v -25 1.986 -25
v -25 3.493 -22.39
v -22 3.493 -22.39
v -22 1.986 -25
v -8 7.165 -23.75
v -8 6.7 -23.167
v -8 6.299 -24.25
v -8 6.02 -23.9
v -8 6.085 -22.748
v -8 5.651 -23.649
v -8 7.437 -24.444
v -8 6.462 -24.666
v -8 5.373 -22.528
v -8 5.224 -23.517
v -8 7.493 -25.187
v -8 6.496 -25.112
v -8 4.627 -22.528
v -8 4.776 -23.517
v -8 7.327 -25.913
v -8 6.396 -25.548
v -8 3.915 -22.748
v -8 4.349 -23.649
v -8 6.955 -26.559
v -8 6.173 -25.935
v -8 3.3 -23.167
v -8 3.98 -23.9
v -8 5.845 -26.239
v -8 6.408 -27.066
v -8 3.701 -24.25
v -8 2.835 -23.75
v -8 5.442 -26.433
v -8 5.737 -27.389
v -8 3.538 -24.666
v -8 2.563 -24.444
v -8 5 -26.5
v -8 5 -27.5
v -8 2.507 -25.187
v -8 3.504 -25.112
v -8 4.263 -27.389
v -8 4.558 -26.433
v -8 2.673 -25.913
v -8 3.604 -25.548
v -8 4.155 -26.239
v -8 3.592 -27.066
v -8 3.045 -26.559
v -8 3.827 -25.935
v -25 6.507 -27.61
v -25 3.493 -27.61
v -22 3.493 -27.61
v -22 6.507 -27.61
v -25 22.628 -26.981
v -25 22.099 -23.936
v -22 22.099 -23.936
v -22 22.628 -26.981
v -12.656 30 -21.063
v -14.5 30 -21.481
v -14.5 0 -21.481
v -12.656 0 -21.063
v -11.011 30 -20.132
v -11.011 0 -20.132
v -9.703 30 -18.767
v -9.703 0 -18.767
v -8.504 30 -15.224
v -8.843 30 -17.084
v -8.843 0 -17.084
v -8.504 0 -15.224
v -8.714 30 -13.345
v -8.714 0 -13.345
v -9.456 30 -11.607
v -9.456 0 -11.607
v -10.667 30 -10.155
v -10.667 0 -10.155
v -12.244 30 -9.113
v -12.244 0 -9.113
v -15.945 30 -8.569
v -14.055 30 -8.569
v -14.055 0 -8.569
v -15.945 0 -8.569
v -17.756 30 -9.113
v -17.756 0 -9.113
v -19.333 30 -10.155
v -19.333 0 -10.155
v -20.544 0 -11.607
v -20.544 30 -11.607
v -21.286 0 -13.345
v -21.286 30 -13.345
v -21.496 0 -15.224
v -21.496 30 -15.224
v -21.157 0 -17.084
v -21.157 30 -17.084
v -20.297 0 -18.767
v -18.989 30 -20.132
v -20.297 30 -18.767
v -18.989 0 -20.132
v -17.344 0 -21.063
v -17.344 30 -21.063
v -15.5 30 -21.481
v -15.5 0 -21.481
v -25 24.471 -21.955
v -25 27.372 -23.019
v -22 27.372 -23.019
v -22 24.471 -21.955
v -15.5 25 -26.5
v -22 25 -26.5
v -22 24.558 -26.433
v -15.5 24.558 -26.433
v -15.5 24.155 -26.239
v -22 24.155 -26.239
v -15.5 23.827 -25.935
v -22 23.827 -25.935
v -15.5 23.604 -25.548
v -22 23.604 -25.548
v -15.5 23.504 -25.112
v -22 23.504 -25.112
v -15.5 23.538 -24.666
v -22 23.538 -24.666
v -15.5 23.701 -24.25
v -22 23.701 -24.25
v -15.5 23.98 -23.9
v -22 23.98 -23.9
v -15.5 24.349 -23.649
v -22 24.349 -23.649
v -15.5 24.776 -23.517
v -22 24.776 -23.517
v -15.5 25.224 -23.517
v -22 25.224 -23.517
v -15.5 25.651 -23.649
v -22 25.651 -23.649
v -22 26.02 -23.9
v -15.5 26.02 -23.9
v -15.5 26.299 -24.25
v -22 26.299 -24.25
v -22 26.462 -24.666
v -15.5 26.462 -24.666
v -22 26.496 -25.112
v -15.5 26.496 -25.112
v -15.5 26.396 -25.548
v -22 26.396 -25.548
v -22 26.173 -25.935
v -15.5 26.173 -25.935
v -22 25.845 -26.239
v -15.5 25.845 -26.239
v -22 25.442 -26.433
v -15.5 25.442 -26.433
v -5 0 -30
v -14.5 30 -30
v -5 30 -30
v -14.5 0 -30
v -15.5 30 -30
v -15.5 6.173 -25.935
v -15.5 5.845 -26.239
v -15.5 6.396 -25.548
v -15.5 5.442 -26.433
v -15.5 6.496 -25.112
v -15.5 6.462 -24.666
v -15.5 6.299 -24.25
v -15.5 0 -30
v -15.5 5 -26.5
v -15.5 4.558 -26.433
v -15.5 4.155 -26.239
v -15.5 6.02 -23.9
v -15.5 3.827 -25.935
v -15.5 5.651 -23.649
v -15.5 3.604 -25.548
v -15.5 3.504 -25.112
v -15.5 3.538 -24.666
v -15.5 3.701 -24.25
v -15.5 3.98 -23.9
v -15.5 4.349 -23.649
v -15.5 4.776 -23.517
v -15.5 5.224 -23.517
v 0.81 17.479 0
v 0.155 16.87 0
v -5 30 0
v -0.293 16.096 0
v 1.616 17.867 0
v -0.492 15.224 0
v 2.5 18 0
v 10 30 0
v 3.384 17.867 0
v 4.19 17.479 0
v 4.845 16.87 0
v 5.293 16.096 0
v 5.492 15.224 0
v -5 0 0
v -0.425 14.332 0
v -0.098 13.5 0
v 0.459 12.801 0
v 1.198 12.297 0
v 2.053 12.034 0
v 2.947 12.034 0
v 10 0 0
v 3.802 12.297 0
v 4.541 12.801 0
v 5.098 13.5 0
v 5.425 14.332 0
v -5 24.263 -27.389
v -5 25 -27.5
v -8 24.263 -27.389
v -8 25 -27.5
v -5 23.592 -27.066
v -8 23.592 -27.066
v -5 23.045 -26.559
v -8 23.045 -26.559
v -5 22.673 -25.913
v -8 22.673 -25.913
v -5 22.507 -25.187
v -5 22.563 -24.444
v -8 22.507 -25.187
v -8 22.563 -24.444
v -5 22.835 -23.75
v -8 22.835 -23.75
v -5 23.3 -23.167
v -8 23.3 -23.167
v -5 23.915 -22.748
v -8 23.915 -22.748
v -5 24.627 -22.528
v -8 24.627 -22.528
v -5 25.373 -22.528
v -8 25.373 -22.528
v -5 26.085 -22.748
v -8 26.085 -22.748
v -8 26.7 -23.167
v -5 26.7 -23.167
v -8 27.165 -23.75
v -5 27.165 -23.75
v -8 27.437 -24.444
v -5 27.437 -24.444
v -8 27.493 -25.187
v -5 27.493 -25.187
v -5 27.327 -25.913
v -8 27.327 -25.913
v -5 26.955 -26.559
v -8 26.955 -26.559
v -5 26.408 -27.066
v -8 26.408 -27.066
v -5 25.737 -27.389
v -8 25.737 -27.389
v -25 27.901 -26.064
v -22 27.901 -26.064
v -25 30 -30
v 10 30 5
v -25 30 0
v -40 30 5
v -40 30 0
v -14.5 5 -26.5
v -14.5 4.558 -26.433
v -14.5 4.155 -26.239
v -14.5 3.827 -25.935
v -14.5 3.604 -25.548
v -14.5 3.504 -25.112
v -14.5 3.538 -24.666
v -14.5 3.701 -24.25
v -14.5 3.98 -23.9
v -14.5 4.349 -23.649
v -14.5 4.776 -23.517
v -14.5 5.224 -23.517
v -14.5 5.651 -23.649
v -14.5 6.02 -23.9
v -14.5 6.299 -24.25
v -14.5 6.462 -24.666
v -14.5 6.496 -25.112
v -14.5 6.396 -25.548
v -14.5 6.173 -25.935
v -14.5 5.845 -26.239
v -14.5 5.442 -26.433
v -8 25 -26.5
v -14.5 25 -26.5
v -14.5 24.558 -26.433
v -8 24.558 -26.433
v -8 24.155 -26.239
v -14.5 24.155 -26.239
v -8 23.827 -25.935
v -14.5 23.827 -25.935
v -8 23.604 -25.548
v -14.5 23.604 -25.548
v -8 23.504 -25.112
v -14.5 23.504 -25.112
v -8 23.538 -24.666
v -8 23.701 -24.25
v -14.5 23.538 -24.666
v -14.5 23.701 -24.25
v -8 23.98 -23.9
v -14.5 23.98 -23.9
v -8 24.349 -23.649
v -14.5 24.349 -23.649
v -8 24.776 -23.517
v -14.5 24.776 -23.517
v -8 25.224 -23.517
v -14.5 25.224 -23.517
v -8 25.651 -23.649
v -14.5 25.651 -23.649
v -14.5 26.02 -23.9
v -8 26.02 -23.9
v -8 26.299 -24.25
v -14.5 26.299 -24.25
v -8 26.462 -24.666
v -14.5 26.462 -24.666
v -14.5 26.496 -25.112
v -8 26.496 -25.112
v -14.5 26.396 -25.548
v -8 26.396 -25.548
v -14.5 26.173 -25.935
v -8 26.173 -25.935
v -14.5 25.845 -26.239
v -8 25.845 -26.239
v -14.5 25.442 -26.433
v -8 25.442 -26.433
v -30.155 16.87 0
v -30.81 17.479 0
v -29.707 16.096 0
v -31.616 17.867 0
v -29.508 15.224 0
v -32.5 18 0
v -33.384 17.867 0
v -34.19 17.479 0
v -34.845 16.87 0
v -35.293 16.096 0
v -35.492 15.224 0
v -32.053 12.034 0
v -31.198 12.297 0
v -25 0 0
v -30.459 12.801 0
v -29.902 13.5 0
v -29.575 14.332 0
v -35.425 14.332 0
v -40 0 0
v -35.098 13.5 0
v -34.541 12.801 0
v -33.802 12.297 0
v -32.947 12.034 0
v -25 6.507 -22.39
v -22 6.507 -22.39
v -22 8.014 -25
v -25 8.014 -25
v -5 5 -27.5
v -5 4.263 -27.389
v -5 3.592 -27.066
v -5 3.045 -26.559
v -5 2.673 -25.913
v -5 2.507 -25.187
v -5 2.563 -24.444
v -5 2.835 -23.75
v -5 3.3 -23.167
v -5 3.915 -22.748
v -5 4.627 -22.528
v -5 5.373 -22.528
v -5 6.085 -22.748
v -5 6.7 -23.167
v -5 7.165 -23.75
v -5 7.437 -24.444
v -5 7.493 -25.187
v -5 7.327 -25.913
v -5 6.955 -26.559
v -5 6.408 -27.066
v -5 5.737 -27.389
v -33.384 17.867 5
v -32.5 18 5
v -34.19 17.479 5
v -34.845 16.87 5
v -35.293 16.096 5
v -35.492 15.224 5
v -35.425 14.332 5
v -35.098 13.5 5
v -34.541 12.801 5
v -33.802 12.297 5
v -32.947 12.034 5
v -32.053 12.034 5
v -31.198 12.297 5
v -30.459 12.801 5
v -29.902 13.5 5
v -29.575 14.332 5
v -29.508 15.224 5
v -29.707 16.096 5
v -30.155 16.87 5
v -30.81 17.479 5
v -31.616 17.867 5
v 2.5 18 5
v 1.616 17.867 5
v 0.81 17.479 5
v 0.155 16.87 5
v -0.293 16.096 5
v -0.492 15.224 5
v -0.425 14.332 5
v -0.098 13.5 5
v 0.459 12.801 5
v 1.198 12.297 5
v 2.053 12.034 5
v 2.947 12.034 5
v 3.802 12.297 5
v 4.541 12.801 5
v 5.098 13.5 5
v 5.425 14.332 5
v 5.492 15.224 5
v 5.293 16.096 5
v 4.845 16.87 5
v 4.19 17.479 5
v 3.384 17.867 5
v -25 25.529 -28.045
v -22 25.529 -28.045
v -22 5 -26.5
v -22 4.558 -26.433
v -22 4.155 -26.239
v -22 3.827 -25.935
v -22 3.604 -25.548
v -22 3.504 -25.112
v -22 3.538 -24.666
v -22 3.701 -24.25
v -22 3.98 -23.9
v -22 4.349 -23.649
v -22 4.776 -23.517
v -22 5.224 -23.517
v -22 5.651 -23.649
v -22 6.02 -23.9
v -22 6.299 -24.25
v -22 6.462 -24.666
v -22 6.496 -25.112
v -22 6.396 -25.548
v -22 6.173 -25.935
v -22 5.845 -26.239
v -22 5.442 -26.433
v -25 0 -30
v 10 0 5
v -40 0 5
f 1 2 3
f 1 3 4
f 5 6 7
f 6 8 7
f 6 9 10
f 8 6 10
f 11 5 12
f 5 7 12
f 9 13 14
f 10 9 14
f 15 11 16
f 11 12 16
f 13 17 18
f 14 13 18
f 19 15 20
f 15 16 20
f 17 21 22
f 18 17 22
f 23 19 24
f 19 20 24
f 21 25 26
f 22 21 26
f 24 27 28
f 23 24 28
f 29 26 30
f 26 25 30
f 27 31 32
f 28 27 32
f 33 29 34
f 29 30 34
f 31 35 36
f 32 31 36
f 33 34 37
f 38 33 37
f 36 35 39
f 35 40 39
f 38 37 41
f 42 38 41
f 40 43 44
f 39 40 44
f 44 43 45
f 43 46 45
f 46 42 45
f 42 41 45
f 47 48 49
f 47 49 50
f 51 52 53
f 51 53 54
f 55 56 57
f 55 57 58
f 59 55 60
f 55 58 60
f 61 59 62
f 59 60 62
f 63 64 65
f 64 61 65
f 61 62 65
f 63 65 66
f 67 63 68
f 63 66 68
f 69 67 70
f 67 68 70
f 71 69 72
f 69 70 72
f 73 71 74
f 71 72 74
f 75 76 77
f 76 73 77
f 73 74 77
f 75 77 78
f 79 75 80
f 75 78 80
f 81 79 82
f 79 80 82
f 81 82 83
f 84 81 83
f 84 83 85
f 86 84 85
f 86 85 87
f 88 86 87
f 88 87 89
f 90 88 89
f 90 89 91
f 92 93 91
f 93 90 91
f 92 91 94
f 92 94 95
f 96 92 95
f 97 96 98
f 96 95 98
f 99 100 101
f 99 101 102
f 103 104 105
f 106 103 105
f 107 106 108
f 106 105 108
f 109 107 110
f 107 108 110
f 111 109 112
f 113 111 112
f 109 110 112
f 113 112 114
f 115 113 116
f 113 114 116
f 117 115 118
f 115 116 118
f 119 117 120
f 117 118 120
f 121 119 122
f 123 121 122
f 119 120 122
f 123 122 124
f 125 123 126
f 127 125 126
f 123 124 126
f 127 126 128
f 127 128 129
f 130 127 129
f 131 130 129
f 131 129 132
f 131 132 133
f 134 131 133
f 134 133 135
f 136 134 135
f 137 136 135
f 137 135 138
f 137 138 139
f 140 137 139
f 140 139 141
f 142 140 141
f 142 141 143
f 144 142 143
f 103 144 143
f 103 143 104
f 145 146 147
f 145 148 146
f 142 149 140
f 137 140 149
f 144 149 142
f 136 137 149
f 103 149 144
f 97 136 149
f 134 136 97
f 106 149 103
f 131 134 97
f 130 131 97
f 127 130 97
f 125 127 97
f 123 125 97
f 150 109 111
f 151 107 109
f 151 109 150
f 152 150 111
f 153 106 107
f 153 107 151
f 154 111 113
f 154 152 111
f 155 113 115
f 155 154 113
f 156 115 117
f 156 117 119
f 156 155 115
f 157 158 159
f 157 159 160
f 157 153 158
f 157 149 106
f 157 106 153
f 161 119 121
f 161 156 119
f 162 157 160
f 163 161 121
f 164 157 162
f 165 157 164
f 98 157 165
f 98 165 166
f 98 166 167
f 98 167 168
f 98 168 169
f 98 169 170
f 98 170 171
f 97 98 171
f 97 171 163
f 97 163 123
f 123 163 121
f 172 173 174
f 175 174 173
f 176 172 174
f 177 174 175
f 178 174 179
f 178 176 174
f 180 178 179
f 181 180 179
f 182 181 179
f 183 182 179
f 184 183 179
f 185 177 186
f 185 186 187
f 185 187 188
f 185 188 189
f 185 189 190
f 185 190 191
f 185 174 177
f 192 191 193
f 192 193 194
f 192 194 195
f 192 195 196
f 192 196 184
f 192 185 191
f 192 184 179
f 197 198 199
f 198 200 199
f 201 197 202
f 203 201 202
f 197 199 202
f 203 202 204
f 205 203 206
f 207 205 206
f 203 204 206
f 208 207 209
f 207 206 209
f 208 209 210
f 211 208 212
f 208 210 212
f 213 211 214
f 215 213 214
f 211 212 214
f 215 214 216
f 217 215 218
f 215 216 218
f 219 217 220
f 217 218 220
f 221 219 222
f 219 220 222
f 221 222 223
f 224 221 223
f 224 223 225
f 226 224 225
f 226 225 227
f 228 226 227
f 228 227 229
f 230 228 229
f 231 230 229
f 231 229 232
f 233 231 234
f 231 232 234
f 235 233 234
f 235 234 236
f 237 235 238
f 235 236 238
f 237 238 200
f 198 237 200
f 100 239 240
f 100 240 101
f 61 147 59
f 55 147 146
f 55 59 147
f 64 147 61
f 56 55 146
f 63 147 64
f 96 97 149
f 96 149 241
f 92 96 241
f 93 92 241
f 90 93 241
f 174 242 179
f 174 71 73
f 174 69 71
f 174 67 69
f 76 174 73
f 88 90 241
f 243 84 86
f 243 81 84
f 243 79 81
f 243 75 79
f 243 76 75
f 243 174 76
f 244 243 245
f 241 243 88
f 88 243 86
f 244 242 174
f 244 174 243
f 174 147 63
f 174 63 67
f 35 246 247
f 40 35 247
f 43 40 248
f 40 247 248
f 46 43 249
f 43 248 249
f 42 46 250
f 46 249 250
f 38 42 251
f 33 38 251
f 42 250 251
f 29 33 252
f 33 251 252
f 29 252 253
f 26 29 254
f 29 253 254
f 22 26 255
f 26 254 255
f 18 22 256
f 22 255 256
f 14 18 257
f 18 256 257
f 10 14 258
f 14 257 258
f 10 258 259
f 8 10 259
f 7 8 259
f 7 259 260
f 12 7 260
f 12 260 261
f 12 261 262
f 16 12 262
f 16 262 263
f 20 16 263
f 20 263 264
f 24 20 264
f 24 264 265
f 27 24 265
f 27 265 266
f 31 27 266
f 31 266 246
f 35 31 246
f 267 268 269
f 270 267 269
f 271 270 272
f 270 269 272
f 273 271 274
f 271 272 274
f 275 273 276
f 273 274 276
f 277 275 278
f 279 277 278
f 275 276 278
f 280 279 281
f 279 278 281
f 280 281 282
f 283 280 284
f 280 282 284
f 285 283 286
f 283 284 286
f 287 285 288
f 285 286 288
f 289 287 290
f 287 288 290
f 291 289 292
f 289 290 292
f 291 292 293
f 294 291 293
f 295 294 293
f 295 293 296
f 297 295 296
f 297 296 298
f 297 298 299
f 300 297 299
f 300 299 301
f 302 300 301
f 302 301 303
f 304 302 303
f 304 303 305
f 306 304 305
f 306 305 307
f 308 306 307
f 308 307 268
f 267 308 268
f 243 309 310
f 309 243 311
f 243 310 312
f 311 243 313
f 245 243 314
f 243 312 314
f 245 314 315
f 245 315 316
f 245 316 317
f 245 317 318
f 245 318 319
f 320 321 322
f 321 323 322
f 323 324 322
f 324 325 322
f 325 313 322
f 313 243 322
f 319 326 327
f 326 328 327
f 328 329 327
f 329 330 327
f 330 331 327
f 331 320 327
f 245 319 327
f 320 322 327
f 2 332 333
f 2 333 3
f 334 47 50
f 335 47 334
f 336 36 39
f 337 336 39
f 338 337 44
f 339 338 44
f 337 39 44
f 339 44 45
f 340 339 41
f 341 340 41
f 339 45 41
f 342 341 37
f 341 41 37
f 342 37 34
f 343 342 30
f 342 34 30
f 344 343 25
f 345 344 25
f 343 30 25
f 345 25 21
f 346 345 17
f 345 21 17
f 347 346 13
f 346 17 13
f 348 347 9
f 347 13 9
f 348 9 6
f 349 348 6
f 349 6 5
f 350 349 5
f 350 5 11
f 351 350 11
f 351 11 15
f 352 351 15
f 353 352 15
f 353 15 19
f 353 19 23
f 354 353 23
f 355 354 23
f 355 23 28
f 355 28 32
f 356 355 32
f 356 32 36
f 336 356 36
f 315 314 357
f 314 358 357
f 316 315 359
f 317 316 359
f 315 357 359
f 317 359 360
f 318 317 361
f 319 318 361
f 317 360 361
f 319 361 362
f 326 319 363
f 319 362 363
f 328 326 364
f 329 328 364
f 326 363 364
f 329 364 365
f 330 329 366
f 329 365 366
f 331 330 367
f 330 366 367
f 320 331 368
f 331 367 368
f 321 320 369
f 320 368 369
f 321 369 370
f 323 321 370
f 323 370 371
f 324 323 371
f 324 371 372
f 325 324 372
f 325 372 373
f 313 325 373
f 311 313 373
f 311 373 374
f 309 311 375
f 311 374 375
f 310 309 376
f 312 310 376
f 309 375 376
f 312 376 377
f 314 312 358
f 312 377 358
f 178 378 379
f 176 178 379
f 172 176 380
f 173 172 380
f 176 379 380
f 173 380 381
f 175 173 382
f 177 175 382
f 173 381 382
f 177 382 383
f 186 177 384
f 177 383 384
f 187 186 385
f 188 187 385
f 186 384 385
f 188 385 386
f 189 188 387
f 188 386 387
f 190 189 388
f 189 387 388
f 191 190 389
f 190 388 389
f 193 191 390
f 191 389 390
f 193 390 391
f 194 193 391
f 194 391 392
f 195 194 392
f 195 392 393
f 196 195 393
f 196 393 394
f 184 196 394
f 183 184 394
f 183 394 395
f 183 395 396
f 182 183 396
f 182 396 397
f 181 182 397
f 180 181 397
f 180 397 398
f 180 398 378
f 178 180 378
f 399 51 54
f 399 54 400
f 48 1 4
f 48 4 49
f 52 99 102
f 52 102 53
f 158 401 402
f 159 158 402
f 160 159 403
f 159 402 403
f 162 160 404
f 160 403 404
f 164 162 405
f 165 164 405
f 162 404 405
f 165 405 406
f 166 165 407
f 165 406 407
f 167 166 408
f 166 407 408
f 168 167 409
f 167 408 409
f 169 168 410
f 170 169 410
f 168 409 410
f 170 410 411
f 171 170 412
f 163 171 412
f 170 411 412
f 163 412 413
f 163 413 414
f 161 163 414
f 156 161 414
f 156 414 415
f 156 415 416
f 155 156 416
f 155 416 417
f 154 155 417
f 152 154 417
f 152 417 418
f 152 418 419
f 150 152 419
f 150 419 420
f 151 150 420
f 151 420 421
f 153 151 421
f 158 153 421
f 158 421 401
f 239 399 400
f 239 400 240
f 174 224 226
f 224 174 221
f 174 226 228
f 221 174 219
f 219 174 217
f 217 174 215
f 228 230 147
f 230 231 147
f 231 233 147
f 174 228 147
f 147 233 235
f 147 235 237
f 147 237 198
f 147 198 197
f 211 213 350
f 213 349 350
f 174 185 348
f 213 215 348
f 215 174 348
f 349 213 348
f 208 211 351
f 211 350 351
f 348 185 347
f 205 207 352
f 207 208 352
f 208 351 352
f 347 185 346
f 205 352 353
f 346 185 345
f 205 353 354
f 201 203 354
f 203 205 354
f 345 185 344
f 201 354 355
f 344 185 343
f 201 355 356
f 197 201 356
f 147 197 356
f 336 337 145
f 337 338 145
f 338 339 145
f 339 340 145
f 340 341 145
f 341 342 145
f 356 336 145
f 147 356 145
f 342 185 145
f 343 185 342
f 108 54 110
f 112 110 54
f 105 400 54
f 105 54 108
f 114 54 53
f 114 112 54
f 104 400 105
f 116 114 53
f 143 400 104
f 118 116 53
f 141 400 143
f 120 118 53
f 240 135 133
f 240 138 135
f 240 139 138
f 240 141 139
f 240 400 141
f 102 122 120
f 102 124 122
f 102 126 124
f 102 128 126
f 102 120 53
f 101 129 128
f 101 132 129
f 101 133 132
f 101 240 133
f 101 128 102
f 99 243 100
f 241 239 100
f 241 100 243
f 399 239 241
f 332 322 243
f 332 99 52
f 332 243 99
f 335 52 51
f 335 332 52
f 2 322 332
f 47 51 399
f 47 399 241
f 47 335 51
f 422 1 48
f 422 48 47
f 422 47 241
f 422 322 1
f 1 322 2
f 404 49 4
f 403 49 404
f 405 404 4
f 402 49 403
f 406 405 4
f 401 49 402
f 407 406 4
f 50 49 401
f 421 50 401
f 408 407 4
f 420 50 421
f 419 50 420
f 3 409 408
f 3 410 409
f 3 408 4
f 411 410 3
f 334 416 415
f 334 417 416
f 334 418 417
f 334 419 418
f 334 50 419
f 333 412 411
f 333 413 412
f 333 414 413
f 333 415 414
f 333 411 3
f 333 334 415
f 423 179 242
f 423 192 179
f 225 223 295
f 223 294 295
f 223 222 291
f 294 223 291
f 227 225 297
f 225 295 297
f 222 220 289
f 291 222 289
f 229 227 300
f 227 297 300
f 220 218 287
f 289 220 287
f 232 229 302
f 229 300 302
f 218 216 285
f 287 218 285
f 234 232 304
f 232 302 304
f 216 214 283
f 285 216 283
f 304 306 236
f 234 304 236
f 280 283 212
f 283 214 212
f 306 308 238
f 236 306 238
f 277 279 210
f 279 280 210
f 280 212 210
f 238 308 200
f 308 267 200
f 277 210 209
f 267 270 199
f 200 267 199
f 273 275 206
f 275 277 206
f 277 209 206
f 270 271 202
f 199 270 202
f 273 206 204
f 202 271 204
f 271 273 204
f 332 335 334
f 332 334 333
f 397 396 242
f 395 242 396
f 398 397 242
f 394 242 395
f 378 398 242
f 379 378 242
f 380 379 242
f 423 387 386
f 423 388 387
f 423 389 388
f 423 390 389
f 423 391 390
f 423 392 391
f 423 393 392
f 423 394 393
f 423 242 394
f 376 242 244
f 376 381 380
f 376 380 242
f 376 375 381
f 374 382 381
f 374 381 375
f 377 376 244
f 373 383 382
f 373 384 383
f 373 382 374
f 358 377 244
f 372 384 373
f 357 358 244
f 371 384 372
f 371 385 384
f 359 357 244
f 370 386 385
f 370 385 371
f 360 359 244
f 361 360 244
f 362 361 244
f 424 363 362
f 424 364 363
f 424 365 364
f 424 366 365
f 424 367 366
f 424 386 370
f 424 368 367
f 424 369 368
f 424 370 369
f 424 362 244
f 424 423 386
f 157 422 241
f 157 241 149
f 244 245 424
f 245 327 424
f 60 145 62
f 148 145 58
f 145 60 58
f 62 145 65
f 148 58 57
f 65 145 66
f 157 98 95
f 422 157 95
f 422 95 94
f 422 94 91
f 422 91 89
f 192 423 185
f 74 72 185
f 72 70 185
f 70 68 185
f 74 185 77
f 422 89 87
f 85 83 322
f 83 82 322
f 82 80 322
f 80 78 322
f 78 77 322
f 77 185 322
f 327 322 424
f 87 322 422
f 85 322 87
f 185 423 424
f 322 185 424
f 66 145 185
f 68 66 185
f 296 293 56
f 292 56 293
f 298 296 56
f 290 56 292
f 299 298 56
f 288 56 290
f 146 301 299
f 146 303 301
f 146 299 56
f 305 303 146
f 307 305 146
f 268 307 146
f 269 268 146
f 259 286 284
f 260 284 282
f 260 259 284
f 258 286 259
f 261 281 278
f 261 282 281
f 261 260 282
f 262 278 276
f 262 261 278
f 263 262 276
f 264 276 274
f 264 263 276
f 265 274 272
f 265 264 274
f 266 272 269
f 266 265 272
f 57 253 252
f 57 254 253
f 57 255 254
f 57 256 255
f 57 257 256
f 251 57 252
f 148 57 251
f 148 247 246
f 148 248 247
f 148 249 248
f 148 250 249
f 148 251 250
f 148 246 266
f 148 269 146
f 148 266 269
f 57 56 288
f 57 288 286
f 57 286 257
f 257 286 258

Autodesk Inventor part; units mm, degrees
ref_plane "YZ Plane" through (0, 0, 0) normal (1, 0, 0) x (0, 1, 0)
ref_plane "XZ Plane" through (0, 0, 0) normal (0, 1, 0) x (-1, 0, 0)
ref_plane "XY Plane" through (0, 0, 0) normal (0, 0, 1) x (1, 0, 0)
sketch "Sketch1" plane through (0, 0, 0) normal (0, 1, 0) x (-1, 0, 0)
  line L0 (5, 0) -> (25, 0)
  arc A0 (15.5, -21.4807) -> (14.5, -21.4807) centre (15, -15) ccw
  line L1 (14.5, -21.4807) -> (14.5, -30)
  line L2 (15.5, -30) -> (15.5, -21.4807)
  line L3 (14.5, -20.3939) -> (15.5, -30) construction
  line L4 (14.5, -30) -> (15.386, -21.4885) construction
  line L5 (25, -30) -> (15.5, -30)
  line L6 (14.5, -30) -> (5, -30)
  line L7 (25, 0) -> (25, -30)
  line L8 (5, 0) -> (5, -30)
  line L9 (25, 0) -> (40, 0)
  line L10 (40, 0) -> (40, 5)
  line L11 (5, 0) -> (-10, 0)
  line L12 (-10, 0) -> (-10, 5)
  line L13 (-10, 5) -> (40, 5)
  point P0 (0, 0)
  point P1 (15, -25.1969)
  dimension "d2" = 13
  dimension "d26" = 15
  dimension "d28" = 15
extrude "Extrusion1" add sketch "Sketch1" along normal blind 30
hole "Hole1" at (-5, 25, -25) direction (-1, 0, 0) diameter 3 end through all counterbore diameter 5 counterbore depth 3
hole "Hole2" at (-5, 5, -25) direction (-1, 0, 0) diameter 3 end through all counterbore diameter 5 counterbore depth 3
sketch "Sketch2" plane through (-25, 0, -30) normal (-1, 0, 0) x (0, 0, 1)
  circle A0 centre (5, 25) radius 1.5 projected
  line L0 (3.9359, 27.9014) -> (6.9806, 27.3722)
  line L1 (6.9806, 27.3722) -> (8.0447, 24.4708)
  line L2 (8.0447, 24.4708) -> (6.0641, 22.0986)
  line L3 (6.0641, 22.0986) -> (3.0194, 22.6278)
  line L4 (3.0194, 22.6278) -> (1.9553, 25.5292)
  line L5 (1.9553, 25.5292) -> (3.9359, 27.9014)
  circle A1 centre (5, 5) radius 1.5 projected
  line L6 (5, 8.0137) -> (7.61, 6.5069)
  line L7 (7.61, 6.5069) -> (7.61, 3.4931)
  line L8 (7.61, 3.4931) -> (5, 1.9863)
  line L9 (5, 1.9863) -> (2.39, 3.4931)
  line L10 (2.39, 3.4931) -> (2.39, 6.5069)
  line L11 (2.39, 6.5069) -> (5, 8.0137)
  point P0 (30, 0)
extrude "Extrusion2" cut sketch "Sketch2" against normal blind 3
hole "Hole3" at (-32.5, 15, 0) direction (0, 0, 1) diameter 6 end through all
hole "Hole4" at (2.5, 15, 0) direction (0, 0, 1) diameter 6 end through all
properties part number "WaterPumpHolder"
